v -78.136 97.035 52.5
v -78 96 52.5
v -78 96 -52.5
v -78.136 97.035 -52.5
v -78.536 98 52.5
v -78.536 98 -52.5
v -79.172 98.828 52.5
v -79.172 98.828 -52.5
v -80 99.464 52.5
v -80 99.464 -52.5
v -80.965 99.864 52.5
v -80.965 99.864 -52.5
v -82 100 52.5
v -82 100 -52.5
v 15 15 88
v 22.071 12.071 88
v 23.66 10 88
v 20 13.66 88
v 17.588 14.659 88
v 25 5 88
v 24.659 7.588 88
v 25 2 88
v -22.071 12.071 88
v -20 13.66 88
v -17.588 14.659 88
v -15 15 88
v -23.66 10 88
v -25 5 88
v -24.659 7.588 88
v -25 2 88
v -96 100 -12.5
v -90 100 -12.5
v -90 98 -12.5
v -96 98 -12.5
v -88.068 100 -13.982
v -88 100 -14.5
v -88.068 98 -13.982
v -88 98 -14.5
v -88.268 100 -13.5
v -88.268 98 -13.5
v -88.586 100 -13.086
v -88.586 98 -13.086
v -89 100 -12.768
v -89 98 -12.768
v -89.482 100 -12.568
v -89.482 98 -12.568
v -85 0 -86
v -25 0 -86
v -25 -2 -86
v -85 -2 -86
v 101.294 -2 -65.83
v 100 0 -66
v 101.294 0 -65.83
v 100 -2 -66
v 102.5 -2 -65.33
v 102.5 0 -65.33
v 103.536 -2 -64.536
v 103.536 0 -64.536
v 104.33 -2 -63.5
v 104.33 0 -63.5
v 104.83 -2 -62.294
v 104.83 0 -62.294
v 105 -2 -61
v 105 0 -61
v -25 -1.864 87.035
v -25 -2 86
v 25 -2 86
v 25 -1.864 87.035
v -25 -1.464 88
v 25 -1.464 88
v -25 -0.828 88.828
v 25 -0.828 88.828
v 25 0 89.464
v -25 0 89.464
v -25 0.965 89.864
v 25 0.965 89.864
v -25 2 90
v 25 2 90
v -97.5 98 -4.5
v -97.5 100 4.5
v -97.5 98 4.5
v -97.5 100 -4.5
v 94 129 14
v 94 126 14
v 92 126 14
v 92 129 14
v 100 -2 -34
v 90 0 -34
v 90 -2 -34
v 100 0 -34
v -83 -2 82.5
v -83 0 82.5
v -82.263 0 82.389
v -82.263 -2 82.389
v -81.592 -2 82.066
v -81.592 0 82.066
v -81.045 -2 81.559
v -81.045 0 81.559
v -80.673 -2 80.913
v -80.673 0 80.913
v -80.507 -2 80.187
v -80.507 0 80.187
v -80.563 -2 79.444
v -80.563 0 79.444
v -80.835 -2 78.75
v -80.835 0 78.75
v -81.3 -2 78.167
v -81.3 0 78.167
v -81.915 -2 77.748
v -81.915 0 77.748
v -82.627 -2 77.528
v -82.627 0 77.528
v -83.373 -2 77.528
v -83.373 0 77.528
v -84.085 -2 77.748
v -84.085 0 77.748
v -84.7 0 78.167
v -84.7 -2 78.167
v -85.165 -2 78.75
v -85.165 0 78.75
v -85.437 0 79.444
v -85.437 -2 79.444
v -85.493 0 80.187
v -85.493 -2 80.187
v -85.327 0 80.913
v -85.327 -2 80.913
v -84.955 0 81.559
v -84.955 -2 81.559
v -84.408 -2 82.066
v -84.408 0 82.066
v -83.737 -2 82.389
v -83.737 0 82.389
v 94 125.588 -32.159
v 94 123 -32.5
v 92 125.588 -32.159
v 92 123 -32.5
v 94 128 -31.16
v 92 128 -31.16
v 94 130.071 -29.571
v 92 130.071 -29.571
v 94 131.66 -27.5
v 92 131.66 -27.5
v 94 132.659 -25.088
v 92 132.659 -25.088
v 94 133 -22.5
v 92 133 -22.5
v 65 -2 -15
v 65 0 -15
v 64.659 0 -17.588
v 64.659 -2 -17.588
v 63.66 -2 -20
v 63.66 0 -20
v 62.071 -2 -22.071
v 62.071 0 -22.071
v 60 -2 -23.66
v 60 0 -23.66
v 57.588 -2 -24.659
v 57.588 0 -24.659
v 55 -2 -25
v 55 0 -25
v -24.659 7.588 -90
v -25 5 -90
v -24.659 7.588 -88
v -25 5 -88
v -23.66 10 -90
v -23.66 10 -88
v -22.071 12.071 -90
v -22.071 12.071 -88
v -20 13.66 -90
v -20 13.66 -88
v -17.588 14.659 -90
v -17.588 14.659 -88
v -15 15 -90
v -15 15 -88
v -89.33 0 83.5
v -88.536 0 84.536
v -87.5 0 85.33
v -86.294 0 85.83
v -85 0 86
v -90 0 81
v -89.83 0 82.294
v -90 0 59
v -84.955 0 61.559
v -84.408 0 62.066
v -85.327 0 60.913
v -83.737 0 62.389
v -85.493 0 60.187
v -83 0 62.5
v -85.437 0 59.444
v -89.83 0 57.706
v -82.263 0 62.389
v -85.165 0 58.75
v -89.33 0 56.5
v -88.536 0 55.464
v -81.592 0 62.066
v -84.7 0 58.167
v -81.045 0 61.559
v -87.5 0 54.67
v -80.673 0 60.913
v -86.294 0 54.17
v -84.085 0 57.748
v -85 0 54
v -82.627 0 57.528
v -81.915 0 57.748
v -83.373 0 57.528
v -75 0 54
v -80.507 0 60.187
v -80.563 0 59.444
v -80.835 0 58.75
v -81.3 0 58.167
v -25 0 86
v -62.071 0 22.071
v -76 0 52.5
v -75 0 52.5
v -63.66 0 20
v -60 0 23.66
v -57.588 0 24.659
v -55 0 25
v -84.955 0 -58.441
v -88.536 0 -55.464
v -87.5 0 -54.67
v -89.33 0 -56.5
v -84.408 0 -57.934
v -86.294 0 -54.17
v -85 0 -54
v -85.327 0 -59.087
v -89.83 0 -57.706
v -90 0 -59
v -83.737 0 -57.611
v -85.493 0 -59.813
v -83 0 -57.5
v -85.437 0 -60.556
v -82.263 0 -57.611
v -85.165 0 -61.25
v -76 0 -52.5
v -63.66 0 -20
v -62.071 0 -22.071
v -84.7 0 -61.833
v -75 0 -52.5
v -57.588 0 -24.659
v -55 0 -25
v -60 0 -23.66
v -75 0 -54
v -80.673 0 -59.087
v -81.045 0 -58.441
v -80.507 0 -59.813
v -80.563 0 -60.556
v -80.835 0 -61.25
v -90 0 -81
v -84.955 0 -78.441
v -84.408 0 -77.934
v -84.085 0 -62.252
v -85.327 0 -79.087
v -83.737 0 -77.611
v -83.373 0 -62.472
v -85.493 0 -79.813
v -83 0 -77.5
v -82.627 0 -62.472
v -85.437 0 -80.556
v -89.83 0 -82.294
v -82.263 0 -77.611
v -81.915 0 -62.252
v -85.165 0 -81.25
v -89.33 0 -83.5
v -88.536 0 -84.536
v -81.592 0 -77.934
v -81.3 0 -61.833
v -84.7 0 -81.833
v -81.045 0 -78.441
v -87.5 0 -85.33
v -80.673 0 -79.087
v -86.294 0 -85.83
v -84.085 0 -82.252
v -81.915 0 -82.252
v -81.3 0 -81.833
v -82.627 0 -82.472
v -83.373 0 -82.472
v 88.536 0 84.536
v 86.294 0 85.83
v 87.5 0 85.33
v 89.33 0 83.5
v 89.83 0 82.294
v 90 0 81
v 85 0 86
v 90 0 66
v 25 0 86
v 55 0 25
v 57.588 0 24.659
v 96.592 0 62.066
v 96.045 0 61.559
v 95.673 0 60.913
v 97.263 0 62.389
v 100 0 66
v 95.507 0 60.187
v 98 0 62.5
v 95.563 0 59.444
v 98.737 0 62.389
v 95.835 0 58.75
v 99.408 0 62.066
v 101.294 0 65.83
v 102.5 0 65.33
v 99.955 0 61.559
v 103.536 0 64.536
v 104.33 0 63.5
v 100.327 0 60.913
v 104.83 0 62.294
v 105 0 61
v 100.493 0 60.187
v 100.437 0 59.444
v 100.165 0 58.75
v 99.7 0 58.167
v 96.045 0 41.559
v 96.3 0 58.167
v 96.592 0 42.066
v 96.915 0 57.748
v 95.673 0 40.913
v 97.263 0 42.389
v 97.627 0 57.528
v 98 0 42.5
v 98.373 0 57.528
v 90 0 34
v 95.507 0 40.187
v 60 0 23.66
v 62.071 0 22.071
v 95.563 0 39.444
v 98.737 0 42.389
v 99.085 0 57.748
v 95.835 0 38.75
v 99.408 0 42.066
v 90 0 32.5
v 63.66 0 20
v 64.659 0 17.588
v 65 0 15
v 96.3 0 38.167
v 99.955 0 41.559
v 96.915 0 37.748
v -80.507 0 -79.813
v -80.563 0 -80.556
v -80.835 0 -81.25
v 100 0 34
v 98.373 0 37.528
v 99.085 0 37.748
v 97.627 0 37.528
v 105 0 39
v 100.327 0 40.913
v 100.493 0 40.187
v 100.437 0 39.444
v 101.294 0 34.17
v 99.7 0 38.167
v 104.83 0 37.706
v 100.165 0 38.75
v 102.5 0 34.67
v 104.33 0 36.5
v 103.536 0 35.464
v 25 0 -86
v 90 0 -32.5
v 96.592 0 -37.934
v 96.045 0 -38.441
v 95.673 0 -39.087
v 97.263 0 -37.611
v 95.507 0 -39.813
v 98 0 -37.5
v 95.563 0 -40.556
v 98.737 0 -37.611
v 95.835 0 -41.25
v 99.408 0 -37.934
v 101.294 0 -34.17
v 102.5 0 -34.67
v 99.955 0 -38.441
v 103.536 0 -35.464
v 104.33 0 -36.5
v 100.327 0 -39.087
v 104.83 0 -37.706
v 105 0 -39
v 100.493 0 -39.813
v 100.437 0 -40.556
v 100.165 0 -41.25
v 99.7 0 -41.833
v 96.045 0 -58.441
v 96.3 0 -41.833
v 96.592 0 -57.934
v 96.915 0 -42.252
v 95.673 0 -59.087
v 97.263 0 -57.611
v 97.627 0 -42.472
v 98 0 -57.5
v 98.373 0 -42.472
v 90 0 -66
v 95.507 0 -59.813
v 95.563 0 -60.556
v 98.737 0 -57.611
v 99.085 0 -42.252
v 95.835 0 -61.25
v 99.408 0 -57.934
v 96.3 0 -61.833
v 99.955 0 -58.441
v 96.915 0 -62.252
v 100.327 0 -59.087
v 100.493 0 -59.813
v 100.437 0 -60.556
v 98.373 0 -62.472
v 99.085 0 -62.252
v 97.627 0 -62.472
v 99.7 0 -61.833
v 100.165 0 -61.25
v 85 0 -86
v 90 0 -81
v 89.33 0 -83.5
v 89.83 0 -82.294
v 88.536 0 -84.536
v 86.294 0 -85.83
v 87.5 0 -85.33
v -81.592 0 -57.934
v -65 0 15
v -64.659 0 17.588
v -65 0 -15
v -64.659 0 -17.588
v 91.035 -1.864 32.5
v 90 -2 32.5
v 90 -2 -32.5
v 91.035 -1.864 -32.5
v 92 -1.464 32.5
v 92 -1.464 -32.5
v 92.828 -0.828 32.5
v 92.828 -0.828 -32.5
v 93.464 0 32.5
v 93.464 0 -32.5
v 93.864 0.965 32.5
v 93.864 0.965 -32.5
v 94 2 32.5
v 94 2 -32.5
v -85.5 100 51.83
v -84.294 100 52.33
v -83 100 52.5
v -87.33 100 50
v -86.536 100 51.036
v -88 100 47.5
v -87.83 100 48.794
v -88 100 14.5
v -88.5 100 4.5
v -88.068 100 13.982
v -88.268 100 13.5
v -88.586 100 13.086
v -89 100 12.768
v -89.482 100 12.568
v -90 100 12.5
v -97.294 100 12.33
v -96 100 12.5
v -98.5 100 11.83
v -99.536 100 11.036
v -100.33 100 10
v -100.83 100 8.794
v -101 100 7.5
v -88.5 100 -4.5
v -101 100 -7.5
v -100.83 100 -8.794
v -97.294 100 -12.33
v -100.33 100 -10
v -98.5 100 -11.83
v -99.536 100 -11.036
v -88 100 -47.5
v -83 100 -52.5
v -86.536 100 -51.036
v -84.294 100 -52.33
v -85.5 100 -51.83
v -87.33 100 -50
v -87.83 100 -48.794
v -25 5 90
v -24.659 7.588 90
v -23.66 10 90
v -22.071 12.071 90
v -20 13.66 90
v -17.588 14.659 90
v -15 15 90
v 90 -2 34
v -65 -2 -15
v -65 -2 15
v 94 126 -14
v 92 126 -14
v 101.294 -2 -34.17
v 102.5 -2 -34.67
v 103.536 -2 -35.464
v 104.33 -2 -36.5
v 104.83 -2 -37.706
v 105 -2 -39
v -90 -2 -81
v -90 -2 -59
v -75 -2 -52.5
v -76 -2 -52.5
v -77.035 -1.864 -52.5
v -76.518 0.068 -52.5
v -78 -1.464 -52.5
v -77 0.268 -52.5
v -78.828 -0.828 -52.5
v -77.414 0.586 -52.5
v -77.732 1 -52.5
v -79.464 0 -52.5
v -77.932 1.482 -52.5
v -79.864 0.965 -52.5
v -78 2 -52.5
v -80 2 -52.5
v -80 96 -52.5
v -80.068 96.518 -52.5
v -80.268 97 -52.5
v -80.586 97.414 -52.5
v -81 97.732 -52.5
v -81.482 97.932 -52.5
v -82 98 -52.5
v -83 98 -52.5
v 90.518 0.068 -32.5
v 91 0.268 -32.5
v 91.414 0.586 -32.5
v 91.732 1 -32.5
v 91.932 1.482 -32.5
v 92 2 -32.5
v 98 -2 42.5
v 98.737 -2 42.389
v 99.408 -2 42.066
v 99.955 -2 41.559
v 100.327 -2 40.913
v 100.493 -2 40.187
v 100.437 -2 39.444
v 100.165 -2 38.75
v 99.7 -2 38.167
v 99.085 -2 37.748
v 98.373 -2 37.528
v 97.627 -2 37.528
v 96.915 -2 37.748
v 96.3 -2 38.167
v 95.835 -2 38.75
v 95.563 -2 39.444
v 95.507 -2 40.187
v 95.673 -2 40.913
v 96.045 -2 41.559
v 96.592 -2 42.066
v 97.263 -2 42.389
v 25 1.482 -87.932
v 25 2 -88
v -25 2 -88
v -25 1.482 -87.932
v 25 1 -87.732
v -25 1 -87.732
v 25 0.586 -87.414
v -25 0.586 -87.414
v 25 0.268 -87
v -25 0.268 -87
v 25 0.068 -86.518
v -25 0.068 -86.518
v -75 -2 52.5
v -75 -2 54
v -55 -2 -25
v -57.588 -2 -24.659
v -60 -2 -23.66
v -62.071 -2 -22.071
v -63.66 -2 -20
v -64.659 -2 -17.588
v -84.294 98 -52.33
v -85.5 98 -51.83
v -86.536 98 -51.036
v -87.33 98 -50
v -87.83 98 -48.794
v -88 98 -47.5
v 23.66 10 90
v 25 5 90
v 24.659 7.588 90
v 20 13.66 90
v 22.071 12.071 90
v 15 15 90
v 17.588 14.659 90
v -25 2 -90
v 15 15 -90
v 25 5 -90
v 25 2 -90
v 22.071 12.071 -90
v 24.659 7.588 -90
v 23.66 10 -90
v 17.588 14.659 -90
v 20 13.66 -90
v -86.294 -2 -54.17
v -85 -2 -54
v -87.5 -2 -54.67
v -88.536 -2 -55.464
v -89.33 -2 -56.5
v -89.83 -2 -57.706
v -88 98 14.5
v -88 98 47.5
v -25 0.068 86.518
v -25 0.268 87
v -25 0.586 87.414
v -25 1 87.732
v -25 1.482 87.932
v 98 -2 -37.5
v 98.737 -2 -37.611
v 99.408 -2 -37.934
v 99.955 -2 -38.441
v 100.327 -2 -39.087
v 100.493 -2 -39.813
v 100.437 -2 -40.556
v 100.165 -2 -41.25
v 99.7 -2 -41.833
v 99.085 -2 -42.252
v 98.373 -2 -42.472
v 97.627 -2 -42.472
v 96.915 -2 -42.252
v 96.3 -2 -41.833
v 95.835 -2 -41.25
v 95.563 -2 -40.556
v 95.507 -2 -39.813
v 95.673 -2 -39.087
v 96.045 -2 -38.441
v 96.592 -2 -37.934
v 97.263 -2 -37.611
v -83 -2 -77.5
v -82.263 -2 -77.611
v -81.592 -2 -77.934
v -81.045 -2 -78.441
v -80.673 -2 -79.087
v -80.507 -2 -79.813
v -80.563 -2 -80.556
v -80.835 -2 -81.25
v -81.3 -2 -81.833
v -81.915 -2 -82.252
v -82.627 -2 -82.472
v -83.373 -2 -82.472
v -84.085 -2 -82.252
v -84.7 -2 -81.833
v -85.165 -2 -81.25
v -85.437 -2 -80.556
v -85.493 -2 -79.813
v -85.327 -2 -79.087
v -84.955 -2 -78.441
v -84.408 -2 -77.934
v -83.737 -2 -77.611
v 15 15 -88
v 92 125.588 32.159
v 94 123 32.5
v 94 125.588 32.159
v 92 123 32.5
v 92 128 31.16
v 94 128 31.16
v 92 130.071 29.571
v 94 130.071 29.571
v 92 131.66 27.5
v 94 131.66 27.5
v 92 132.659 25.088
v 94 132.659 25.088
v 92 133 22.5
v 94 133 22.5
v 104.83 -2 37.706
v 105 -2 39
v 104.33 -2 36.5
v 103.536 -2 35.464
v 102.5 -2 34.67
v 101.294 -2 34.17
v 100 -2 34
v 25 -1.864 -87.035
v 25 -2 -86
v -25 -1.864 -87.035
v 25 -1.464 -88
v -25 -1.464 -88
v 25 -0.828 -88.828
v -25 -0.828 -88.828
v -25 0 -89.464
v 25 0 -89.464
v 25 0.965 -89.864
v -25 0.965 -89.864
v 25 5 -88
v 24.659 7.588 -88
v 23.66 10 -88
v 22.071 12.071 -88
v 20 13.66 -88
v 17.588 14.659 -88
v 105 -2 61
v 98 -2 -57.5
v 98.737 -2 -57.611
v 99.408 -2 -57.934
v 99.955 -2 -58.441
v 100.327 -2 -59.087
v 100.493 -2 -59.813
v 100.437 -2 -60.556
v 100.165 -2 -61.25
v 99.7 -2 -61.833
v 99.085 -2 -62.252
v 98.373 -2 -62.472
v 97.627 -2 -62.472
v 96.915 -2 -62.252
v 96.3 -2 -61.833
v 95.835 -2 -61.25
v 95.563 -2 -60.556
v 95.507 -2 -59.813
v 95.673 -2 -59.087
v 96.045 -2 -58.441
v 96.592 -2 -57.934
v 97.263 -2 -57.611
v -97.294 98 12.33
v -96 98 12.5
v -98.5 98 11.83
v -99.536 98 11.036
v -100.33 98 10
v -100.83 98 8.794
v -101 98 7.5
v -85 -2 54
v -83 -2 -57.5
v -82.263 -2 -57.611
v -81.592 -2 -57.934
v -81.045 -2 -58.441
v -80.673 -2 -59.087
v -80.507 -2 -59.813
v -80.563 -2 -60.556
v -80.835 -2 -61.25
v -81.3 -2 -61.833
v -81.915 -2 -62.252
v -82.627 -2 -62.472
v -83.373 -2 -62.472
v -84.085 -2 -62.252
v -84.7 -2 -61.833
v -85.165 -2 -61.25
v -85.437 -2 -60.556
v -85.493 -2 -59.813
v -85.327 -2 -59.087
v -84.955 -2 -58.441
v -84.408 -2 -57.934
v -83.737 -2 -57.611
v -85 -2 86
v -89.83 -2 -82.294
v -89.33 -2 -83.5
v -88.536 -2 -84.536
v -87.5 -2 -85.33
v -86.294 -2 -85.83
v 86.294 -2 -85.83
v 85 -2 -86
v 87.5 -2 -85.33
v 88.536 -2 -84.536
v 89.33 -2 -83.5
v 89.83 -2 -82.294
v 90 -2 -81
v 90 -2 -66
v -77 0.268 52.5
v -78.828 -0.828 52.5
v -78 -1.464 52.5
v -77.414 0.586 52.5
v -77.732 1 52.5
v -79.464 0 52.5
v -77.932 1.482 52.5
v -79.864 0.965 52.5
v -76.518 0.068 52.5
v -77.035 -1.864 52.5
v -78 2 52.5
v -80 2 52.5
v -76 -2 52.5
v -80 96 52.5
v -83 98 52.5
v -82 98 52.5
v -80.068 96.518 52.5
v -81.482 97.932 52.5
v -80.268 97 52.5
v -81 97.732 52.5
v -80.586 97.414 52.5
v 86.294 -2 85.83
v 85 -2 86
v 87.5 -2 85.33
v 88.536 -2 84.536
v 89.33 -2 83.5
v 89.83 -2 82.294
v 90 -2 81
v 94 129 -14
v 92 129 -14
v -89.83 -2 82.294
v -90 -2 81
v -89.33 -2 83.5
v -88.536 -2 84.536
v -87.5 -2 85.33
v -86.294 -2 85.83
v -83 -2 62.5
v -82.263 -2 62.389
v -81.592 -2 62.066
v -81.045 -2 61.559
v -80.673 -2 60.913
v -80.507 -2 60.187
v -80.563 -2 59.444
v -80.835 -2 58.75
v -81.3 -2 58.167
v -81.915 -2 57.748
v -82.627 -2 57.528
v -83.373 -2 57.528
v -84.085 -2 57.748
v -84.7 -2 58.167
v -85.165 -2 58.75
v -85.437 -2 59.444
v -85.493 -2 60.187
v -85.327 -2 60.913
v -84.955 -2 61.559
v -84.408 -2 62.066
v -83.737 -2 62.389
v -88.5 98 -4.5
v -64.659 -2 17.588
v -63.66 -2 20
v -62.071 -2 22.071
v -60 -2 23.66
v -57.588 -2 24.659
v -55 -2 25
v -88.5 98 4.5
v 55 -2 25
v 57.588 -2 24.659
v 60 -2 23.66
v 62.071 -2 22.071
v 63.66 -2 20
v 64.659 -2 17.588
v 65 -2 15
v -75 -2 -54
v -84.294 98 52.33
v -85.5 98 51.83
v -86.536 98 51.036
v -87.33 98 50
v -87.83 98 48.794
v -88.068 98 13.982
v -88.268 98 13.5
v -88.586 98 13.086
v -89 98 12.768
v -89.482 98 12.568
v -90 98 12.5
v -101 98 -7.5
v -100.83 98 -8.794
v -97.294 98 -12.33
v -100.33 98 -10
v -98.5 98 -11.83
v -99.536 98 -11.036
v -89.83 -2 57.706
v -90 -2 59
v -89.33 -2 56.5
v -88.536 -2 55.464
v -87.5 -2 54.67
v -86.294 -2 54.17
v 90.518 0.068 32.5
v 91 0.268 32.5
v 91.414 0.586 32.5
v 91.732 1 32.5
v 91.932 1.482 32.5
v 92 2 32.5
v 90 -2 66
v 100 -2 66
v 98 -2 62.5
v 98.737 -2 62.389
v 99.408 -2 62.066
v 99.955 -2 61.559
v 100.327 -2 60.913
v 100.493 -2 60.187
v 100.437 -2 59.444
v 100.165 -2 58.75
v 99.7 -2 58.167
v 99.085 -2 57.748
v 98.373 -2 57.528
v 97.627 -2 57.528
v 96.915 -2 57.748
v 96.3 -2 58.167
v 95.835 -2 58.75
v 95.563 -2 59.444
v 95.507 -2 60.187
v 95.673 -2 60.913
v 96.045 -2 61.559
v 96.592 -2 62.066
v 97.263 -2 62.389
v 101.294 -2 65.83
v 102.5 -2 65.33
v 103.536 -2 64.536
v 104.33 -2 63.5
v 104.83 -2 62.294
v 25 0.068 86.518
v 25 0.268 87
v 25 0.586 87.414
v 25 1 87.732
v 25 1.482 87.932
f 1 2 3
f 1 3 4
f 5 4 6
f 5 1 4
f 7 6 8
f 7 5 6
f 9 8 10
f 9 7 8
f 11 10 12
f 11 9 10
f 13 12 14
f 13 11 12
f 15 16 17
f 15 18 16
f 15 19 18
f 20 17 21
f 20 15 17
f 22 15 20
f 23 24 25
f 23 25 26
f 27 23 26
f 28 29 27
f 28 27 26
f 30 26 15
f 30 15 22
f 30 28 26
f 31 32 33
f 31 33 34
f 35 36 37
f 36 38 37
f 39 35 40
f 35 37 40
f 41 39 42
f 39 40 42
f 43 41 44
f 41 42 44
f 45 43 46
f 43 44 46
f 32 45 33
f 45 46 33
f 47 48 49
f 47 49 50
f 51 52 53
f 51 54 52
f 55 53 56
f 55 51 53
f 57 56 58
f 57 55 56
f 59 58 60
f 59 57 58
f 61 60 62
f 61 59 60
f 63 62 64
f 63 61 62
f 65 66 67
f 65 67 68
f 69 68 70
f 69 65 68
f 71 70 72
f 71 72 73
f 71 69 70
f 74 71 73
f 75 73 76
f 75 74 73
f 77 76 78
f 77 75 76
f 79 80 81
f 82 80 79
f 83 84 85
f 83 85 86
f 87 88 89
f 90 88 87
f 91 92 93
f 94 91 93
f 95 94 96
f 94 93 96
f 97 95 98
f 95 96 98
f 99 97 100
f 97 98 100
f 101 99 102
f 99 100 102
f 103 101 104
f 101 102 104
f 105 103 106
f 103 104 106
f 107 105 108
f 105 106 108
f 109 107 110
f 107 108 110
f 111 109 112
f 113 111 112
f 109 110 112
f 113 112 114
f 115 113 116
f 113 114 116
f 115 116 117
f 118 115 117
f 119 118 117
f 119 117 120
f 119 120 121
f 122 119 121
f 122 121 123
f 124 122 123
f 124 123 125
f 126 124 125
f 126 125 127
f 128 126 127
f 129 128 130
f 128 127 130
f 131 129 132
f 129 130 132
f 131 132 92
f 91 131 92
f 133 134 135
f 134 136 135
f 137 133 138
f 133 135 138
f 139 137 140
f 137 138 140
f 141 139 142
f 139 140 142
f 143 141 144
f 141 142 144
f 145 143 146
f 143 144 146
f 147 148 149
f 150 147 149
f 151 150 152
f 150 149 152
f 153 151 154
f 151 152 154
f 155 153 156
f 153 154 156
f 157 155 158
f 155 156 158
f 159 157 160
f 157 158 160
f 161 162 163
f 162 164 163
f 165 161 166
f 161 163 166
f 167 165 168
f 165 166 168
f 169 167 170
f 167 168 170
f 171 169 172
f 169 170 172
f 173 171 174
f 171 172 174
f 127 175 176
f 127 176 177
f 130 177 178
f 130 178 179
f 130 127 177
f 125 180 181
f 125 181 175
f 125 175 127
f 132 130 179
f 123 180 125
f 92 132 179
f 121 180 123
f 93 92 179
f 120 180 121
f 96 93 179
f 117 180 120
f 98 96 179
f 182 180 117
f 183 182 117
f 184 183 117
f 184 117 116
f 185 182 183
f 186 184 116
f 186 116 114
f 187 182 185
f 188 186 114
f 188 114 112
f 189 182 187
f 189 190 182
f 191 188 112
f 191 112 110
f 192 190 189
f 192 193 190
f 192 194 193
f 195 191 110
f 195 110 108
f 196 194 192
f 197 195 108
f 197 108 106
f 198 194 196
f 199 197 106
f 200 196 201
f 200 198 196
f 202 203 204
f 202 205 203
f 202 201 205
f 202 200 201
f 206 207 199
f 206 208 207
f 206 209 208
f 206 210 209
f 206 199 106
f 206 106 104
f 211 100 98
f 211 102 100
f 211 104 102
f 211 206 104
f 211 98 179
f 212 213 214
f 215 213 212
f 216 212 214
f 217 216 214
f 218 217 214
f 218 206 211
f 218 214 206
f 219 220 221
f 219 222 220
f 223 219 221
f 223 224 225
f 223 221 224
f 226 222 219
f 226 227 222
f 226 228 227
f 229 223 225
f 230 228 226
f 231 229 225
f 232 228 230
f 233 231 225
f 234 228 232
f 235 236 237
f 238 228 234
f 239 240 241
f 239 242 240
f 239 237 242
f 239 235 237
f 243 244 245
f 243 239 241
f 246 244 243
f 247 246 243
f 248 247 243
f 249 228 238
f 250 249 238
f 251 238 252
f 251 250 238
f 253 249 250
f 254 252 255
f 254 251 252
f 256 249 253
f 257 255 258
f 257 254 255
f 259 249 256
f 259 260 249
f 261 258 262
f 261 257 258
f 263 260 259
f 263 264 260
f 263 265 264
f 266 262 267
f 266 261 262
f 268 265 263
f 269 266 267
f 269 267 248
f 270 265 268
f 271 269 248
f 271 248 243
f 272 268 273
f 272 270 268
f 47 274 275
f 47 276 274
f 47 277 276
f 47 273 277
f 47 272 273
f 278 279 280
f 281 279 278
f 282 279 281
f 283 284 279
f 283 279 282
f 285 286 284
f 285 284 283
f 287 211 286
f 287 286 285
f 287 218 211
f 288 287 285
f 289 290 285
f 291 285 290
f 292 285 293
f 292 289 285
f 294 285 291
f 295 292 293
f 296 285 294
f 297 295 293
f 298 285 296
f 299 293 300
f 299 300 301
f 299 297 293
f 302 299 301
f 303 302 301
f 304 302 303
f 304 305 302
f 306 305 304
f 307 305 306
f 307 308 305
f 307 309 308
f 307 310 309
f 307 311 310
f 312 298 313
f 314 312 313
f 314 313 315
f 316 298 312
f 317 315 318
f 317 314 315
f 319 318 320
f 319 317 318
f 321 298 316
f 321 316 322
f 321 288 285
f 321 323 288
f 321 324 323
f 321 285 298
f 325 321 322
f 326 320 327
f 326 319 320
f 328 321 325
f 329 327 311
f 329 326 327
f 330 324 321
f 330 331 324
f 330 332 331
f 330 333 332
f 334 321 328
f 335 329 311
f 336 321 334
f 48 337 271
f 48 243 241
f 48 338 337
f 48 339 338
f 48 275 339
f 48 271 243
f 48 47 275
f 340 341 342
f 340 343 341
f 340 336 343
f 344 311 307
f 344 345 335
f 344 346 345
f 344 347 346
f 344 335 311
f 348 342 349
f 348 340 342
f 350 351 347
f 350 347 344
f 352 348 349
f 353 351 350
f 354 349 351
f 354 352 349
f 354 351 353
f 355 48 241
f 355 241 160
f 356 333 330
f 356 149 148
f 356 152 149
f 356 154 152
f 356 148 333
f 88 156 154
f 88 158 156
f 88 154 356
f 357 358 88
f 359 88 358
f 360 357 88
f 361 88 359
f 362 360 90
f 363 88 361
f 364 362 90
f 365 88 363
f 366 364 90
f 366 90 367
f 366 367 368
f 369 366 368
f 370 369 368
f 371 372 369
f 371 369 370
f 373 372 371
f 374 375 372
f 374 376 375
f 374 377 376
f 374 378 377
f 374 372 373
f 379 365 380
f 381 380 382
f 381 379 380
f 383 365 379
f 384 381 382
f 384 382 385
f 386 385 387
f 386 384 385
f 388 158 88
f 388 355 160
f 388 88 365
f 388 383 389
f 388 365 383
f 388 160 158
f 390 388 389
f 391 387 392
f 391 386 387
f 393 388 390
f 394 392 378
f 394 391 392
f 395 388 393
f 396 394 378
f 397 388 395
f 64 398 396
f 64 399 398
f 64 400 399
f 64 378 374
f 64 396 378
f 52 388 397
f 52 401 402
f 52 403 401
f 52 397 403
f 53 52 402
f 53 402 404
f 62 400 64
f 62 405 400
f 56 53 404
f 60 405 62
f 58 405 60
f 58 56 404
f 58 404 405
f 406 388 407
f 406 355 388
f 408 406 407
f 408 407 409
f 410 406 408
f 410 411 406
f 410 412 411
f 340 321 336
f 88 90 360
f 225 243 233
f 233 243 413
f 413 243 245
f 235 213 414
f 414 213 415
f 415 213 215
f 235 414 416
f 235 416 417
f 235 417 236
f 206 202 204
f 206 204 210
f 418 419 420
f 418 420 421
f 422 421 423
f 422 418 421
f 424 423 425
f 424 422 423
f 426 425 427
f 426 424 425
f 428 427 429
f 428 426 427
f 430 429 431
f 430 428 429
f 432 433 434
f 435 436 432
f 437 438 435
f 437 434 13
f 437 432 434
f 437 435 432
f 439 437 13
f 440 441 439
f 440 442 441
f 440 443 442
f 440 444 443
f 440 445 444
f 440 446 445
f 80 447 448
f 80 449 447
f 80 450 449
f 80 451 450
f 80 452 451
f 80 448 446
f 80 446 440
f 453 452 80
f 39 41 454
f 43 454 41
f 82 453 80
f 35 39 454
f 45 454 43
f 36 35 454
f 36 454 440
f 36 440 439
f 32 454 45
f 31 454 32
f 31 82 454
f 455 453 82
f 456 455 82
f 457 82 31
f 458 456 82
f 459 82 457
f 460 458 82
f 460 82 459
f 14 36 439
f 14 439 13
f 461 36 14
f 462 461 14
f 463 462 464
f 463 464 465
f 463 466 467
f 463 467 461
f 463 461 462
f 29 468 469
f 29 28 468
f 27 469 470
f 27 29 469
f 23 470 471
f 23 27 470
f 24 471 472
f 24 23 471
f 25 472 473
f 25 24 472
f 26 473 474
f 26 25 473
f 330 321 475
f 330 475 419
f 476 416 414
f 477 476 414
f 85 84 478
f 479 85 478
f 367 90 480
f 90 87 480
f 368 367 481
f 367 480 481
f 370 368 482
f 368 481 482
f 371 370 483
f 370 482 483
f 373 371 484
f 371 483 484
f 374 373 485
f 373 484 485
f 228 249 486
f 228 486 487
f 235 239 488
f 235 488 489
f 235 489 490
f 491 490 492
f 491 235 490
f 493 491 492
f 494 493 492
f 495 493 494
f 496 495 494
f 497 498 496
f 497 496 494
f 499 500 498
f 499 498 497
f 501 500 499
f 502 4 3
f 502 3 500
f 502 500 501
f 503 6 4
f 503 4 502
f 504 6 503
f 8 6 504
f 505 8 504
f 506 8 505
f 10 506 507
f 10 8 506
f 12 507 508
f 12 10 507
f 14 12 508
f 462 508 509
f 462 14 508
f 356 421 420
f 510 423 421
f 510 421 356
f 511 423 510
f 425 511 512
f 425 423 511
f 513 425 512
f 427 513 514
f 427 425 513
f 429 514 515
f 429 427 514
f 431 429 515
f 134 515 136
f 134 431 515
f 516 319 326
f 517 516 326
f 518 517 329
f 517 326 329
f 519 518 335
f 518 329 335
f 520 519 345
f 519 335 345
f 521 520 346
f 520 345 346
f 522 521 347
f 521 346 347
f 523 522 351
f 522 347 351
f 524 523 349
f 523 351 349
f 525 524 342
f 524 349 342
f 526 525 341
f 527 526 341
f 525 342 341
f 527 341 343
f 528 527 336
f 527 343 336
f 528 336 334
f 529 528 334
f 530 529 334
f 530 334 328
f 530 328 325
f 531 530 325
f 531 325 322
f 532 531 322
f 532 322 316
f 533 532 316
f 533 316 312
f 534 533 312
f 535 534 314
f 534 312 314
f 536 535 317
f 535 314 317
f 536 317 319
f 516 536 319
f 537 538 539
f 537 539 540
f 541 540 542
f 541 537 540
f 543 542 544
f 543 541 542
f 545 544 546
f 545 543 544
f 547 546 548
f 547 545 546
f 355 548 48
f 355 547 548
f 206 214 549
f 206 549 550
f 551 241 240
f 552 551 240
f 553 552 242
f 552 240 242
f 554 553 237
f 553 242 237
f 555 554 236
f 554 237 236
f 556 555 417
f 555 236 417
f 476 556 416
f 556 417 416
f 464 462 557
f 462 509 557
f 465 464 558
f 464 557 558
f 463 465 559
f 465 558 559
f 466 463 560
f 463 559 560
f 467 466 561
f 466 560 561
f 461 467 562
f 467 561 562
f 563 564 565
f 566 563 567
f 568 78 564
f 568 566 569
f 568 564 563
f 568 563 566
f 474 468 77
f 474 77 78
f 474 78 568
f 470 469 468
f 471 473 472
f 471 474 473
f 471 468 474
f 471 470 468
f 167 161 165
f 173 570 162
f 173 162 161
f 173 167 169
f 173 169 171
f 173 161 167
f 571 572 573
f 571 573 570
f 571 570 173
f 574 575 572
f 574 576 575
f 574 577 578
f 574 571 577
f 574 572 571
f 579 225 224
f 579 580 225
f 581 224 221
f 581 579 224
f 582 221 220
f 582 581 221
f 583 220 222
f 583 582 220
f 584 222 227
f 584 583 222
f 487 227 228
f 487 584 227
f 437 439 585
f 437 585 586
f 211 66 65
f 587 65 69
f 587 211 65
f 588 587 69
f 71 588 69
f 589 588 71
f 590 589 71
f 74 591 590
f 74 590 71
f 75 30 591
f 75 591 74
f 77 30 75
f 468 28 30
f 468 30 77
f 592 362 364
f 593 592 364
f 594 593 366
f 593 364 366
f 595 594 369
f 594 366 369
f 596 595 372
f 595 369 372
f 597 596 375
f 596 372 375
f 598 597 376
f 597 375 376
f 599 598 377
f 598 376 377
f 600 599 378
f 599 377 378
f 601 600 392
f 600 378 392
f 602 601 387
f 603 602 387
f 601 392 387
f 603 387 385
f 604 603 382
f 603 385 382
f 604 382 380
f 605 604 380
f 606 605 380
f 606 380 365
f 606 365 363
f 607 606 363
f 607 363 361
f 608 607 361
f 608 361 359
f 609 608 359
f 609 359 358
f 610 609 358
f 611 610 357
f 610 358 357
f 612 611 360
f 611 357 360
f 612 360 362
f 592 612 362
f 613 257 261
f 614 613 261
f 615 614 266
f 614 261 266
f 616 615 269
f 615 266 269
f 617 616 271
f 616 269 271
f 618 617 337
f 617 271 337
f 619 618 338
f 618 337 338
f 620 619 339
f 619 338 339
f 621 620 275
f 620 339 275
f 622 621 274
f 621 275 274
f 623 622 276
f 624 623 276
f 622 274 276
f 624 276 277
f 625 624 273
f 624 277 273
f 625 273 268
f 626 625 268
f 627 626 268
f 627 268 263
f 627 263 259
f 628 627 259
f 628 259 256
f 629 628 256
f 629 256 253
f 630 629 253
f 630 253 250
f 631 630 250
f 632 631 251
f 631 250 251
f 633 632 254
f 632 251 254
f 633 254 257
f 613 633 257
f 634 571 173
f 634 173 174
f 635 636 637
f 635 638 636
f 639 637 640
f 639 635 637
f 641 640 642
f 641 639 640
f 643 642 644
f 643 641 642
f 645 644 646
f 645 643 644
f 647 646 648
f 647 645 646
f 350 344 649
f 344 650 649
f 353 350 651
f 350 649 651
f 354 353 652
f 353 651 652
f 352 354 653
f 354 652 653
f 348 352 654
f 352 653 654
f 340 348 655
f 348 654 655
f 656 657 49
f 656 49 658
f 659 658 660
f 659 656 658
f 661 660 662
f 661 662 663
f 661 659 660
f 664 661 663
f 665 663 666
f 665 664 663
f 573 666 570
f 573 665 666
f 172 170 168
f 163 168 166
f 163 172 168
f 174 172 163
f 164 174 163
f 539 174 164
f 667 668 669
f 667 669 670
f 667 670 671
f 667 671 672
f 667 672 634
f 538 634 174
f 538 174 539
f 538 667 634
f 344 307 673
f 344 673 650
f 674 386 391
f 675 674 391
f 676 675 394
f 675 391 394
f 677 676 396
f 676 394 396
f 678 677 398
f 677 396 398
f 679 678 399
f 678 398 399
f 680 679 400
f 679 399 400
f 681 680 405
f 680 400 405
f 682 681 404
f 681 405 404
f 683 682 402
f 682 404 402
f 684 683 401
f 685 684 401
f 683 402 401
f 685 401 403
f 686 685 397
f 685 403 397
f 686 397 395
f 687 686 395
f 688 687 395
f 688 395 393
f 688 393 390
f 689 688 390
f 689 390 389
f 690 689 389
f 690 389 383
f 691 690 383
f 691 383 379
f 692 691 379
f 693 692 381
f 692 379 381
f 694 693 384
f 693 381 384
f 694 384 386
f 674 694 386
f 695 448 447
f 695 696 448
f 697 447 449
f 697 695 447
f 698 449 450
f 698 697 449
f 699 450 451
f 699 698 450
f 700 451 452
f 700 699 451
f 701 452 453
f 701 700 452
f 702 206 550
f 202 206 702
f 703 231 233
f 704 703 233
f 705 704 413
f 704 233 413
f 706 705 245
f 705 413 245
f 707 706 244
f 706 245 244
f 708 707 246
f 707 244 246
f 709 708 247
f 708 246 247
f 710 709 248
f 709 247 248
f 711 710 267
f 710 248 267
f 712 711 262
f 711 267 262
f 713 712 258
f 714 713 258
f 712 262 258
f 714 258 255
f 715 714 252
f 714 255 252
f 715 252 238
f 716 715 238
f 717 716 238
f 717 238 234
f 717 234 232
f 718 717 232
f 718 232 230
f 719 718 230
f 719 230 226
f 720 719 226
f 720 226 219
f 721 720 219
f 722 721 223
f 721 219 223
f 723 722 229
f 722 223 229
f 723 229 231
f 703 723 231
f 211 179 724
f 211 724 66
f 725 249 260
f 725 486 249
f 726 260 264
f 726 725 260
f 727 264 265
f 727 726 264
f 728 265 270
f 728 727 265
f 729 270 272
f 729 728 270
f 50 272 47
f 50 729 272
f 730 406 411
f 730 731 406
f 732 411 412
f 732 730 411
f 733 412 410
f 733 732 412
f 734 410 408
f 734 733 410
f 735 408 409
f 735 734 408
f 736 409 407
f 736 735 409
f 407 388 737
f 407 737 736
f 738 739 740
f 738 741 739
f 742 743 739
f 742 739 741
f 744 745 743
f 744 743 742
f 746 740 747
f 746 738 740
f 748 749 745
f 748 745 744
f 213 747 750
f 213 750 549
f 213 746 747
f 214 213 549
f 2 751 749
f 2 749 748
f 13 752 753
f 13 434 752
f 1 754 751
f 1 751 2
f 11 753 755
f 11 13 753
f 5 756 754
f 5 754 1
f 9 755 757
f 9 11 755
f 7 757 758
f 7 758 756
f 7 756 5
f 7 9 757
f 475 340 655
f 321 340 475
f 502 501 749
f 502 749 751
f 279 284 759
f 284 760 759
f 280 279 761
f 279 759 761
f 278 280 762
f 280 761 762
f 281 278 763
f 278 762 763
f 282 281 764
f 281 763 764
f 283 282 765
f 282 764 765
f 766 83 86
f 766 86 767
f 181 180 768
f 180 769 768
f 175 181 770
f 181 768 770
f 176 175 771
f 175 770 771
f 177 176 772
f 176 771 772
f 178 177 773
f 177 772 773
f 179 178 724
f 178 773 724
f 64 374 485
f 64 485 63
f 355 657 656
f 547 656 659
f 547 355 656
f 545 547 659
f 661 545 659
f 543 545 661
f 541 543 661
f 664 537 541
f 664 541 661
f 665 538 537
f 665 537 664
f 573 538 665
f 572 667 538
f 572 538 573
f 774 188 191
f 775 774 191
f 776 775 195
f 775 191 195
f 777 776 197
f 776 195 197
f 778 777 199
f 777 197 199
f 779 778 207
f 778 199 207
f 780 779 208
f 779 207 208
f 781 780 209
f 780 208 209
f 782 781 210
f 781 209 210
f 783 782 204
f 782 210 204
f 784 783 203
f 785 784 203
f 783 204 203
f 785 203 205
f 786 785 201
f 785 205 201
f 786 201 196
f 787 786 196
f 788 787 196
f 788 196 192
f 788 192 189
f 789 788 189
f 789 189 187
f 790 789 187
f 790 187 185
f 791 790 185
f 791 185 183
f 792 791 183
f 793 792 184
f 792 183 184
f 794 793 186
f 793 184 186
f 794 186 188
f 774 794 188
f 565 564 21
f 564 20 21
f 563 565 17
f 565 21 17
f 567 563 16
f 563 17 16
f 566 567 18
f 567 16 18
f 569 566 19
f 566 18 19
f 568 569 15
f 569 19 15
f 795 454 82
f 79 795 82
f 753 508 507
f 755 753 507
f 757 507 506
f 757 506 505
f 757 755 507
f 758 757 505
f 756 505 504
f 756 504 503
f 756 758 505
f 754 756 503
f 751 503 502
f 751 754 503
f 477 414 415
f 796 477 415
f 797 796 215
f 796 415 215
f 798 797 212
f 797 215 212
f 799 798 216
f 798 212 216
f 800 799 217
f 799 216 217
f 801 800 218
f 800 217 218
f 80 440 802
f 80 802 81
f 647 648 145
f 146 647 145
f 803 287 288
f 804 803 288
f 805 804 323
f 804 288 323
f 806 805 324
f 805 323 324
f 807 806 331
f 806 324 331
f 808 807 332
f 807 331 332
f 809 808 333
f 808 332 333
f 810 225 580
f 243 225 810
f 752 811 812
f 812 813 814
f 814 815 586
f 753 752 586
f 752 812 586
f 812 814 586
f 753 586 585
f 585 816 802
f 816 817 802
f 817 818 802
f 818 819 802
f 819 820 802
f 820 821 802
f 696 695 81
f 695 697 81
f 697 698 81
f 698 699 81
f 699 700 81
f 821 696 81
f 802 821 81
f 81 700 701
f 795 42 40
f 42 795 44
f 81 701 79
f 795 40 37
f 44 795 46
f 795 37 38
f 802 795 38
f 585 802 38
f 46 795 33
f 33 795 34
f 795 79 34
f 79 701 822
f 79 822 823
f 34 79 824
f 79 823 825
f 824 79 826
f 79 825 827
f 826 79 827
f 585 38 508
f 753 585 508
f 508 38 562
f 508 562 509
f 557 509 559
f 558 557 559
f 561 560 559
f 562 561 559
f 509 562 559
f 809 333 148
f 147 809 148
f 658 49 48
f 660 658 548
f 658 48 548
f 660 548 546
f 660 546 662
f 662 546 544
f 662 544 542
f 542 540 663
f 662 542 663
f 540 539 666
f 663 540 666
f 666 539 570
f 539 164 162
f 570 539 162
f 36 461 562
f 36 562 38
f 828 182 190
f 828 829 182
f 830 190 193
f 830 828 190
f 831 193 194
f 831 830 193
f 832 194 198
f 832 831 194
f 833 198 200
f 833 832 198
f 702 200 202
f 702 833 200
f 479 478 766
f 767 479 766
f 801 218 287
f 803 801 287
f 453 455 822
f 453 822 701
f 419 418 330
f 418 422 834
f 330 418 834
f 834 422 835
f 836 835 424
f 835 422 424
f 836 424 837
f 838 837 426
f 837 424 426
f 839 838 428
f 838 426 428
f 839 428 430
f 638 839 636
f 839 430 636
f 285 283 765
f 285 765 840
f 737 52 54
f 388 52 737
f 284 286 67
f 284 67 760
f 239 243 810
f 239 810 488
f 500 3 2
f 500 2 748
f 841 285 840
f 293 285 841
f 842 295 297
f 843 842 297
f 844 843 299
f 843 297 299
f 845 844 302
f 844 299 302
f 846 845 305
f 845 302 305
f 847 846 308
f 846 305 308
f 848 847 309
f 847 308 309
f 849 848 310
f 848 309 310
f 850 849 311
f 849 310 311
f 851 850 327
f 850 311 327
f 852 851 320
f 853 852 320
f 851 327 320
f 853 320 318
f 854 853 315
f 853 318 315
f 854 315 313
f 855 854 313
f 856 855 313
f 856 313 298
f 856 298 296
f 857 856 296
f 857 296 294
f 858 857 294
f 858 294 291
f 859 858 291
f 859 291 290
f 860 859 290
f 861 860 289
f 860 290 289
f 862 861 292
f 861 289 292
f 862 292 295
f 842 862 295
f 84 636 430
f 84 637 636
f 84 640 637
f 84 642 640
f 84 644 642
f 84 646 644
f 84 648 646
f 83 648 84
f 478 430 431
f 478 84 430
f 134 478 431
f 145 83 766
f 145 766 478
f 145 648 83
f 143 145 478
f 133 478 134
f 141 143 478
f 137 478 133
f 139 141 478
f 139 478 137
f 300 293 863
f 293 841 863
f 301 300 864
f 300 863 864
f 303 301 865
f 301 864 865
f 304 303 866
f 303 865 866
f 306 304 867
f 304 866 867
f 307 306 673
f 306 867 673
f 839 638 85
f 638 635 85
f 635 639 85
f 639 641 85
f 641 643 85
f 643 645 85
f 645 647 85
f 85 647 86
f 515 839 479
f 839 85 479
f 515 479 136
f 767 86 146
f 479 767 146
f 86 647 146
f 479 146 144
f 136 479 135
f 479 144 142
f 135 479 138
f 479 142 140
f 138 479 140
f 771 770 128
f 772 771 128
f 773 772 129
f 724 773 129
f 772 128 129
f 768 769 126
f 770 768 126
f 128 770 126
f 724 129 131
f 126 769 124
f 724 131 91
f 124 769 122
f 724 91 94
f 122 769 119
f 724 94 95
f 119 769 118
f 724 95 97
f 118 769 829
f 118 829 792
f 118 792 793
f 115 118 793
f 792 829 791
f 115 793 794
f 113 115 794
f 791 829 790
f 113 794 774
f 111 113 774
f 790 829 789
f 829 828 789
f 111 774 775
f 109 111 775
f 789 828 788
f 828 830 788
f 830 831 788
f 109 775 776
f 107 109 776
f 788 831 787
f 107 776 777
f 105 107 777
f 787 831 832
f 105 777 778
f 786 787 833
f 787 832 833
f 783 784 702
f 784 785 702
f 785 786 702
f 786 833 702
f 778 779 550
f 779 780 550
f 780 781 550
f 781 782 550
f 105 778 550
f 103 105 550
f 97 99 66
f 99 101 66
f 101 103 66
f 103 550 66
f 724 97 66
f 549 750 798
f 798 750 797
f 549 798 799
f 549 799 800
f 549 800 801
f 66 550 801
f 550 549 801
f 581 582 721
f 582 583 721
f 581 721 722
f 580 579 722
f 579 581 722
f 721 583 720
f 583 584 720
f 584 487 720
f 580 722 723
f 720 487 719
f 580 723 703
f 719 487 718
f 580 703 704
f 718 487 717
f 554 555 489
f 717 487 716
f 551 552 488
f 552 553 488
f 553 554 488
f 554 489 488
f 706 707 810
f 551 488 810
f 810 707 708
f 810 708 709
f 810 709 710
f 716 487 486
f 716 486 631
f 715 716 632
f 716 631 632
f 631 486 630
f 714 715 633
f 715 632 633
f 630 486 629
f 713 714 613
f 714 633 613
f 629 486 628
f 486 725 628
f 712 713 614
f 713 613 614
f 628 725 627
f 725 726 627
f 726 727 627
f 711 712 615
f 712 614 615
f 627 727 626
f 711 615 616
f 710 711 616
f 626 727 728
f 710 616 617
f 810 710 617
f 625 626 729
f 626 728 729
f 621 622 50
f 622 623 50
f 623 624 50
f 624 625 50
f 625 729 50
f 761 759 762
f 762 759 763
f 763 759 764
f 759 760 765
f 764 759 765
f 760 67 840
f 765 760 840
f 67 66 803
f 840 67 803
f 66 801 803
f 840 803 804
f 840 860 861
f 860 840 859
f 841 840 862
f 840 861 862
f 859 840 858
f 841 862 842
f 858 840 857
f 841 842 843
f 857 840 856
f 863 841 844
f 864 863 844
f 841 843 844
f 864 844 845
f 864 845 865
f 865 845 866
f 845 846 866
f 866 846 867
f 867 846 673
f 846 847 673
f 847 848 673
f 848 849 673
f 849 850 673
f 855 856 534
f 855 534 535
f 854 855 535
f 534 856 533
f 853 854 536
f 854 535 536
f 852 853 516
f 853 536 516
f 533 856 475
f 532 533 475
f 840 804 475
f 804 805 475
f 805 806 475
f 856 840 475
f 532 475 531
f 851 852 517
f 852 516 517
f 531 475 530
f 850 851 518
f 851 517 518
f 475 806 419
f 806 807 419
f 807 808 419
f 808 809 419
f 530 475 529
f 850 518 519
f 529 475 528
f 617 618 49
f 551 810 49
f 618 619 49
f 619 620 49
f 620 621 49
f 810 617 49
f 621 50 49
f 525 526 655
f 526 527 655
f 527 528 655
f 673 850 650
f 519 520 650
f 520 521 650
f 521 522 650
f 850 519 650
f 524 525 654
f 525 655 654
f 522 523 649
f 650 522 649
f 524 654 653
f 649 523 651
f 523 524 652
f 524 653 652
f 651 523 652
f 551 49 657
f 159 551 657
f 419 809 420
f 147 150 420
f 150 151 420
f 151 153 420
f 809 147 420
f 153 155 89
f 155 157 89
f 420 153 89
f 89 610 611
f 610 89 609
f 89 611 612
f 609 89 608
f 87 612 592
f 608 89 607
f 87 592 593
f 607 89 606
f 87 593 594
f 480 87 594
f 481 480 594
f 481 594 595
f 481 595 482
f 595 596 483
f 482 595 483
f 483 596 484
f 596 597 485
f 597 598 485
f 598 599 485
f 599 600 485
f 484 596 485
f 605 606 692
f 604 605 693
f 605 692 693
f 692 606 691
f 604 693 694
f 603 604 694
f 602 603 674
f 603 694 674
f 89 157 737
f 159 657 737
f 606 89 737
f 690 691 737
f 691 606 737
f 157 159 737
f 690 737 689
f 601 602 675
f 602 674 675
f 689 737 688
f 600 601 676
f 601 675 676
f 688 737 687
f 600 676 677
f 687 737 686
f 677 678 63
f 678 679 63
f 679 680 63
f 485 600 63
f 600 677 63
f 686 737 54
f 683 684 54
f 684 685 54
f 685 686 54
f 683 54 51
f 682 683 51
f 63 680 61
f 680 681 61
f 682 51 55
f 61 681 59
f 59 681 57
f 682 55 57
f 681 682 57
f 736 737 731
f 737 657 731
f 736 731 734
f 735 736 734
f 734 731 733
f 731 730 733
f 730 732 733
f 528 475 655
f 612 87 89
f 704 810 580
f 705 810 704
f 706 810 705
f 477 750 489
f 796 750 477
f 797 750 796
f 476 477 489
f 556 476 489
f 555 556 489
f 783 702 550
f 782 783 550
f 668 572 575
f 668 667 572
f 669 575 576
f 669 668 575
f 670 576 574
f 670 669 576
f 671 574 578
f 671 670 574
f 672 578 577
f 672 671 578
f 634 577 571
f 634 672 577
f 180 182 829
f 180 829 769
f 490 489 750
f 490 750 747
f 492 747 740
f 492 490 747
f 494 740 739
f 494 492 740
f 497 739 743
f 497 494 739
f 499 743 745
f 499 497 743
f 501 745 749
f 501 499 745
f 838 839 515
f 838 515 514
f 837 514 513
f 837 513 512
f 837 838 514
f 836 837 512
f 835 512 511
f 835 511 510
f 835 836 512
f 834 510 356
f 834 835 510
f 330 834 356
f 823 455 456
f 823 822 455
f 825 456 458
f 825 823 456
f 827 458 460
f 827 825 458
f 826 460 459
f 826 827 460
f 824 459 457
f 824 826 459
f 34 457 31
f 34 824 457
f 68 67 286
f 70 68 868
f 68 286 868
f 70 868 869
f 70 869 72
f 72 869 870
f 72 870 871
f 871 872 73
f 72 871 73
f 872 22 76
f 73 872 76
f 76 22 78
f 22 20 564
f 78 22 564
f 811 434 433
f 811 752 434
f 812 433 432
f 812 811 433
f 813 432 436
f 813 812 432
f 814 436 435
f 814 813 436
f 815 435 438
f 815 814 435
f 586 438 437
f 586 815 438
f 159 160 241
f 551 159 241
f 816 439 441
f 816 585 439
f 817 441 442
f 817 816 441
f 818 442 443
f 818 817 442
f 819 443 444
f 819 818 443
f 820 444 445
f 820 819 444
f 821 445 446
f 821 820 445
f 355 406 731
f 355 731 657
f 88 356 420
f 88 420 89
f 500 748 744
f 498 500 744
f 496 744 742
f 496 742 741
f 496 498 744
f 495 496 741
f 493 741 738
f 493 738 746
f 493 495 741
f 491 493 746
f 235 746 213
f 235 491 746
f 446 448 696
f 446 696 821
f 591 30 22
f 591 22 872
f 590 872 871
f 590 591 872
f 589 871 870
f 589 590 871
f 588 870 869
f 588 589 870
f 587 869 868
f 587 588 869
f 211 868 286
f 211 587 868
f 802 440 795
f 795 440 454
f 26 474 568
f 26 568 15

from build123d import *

# Parameters (mm, degrees)
SKETCH_2_R                   = 2.5
SM_BASE_FLANGE_1_DEPTH       = 2
FILLET_1_R                   = 5
SM_EDGE_FLANGE_1_DEPTH       = 105
SM_EDGE_FLANGE_2_DEPTH       = 65
SM_START                     = 2
SM_EDGE_FLANGE_2_PROFILE_W   = 65
SM_EDGE_FLANGE_2_PROFILE_H   = 131
SM_EDGE_FLANGE_2_PROFILE_W_2 = 28
SM_EDGE_FLANGE_2_PROFILE_H_2 = 3
SM_EDGE_FLANGE_2_FLAT_DEPTH  = 2
SM_EDGE_FLANGE_3_DEPTH       = 105
SM_EDGE_FLANGE_3_PROFILE_W   = 9
SM_EDGE_FLANGE_3_PROFILE_H   = 9
SM_EDGE_FLANGE_3_FLAT_DEPTH  = 2
FILLET_3_R                   = 5
FILLET_4_R                   = 2
SM_EDGE_FLANGE_4_DEPTH       = 50
SM_EDGE_FLANGE_4_BEND_DEPTH  = 50
FILLET_2_R                   = 10


# Sheet-metal steps are written as plain solids
with BuildPart() as part:
    # Sketch 2 → Базовая кромка1 (new body)
    with BuildSketch(Plane(origin=(0, 0, 0), x_dir=(1, 0, 0), z_dir=(0, 1, 0))):
        Polygon((-90, -54), (-90, -86), (90, -86), (90, -66), (105, -66), (105, -34), (90, -34), (90, 34), (105, 34), (105, 66), (90, 66), (90, 86), (-90, 86), (-90, 54), (-75, 54), (-75, -54), align=None)
        with Locations(Location((-83, 80, 0), (0, 0, 270))):
            Circle(SKETCH_2_R, mode=Mode.SUBTRACT)
        with Locations(Location((-83, 60, 0), (0, 0, 270))):
            Circle(SKETCH_2_R, mode=Mode.SUBTRACT)
        with Locations(Location((98, 60, 0), (0, 0, 270))):
            Circle(SKETCH_2_R, mode=Mode.SUBTRACT)
        with Locations(Location((98, 40, 0), (0, 0, 270))):
            Circle(SKETCH_2_R, mode=Mode.SUBTRACT)
        with Locations(Location((98, -40, 0), (0, 0, 270))):
            Circle(SKETCH_2_R, mode=Mode.SUBTRACT)
        with Locations(Location((98, -60, 0), (0, 0, 270))):
            Circle(SKETCH_2_R, mode=Mode.SUBTRACT)
        with Locations(Location((-83, -60, 0), (0, 0, 270))):
            Circle(SKETCH_2_R, mode=Mode.SUBTRACT)
        with Locations(Location((-83, -80, 0), (0, 0, 270))):
            Circle(SKETCH_2_R, mode=Mode.SUBTRACT)
        with BuildLine():
            Line((-65, 15), (-65, -15))
            ThreePointArc((-65, -15), (-62.071067812, -22.071067812), (-55, -25))
            Line((-55, -25), (55, -25))
            ThreePointArc((55, -25), (62.071067812, -22.071067812), (65, -15))
            Line((65, -15), (65, 15))
            ThreePointArc((65, 15), (62.071067812, 22.071067812), (55, 25))
            Line((55, 25), (-55, 25))
            ThreePointArc((-55, 25), (-62.071067812, 22.071067812), (-65, 15))
        make_face(mode=Mode.SUBTRACT)
    extrude(amount=-SM_BASE_FLANGE_1_DEPTH)

    # Скругление1
    fillet_1_edges = [part.edges().sort_by_distance(p)[0] for p in [
        (105, -1, 66),
        (90, -1, 86),
        (-90, -1, 86),
        (-90, -1, 54),
        (-90, -1, -54),
        (-90, -1, -86),
        (90, -1, -86),
        (105, -1, -66),
        (105, -1, -34),
        (105, -1, 34),
    ]]
    fillet(fillet_1_edges, radius=FILLET_1_R)

    # Ребро-кромка1 section (across the edge) → Ребро-кромка1 (add)
    with BuildSketch(Plane(origin=(-78, 0, -52.5), x_dir=(1, 0, 0), z_dir=(0, 0, 1))):
        with BuildLine():
            Line((-2, 2), (-2, 96))
            Line((-2, 96), (0, 96))
            Line((0, 96), (0, 2))
            ThreePointArc((0, 2), (0.585786438, 0.585786438), (2, 0))
            Line((2, 0), (3, 0))
            Line((3, 0), (3, -2))
            Line((3, -2), (2, -2))
            ThreePointArc((2, -2), (-0.828427125, -0.828427125), (-2, 2))
        make_face()
    extrude(amount=SM_EDGE_FLANGE_1_DEPTH)

    # Ребро-кромка2 bend section (across the edge) → Ребро-кромка2 (add)
    with BuildSketch(Plane(origin=(92, 0, 32.5), x_dir=(-1, 0, 0), z_dir=(0, 0, -1))):
        with BuildLine():
            Line((-2, 2), (0, 2))
            ThreePointArc((0, 2), (0.585786438, 0.585786438), (2, 0))
            Line((2, 0), (2, -2))
            ThreePointArc((2, -2), (-0.828427125, -0.828427125), (-2, 2))
        make_face()
    extrude(amount=SM_EDGE_FLANGE_2_DEPTH)

    # Ребро-кромка2 profile (on flange) → Ребро-кромка2 flat (add)
    with BuildSketch(Plane(origin=(92, 0, 0), x_dir=(0, 0, -1), z_dir=(1, 0, 0)).offset(SM_START)):
        with Locations((0, 67.5)):
            Rectangle(SM_EDGE_FLANGE_2_PROFILE_W, SM_EDGE_FLANGE_2_PROFILE_H)
        with Locations((0, 127.5)):
            Rectangle(SM_EDGE_FLANGE_2_PROFILE_W_2, SM_EDGE_FLANGE_2_PROFILE_H_2, mode=Mode.SUBTRACT)
    extrude(amount=-SM_EDGE_FLANGE_2_FLAT_DEPTH)

    # Ребро-кромка3 bend section (across the edge) → Ребро-кромка3 (add)
    with BuildSketch(Plane(origin=(-80, 98, 52.5), x_dir=(0, -1, 0), z_dir=(0, 0, -1))):
        with BuildLine():
            Line((-2, 2), (0, 2))
            ThreePointArc((0, 2), (0.585786438, 0.585786438), (2, 0))
            Line((2, 0), (2, -2))
            ThreePointArc((2, -2), (-0.828427125, -0.828427125), (-2, 2))
        make_face()
    extrude(amount=SM_EDGE_FLANGE_3_DEPTH)

    # Ребро-кромка3 profile (on flange) → Ребро-кромка3 flat (add)
    with BuildSketch(Plane(origin=(-80, 98, 0), x_dir=(0, 0, -1), z_dir=(0, 1, 0)).offset(SM_START)):
        Polygon((-52.5, 8), (-52.5, 2), (52.5, 2), (52.5, 8), (12.5, 8), (12.5, 21), (-12.5, 21), (-12.5, 8), align=None)
        with Locations((0, 13)):
            Rectangle(SM_EDGE_FLANGE_3_PROFILE_W, SM_EDGE_FLANGE_3_PROFILE_H, mode=Mode.SUBTRACT)
    extrude(amount=-SM_EDGE_FLANGE_3_FLAT_DEPTH)

    # Скругление3
    fillet_3_edges = [part.edges().sort_by_distance(p)[0] for p in [
        (-88, 99, 52.5),
        (-88, 99, -52.5),
        (-101, 99, -12.5),
        (-101, 99, 12.5),
    ]]
    fillet(fillet_3_edges, radius=FILLET_3_R)

    # Скругление4
    fillet_4_edges = [part.edges().sort_by_distance(p)[0] for p in [
        (-88, 99, -12.5),
        (-88, 99, 12.5),
    ]]
    fillet(fillet_4_edges, radius=FILLET_4_R)

    # Ребро-кромка4 section (across the edge) → Ребро-кромка4 (add)
    with BuildSketch(Plane(origin=(-25, 0, 88), x_dir=(0, 0, -1), z_dir=(1, 0, 0))):
        with BuildLine():
            Line((-2, 2), (-2, 15))
            Line((-2, 15), (0, 15))
            Line((0, 15), (0, 2))
            ThreePointArc((0, 2), (0.585786438, 0.585786438), (2, 0))
            Line((2, 0), (2, -2))
            ThreePointArc((2, -2), (-0.828427125, -0.828427125), (-2, 2))
        make_face()
    extrude(amount=SM_EDGE_FLANGE_4_DEPTH)

    # Ребро-кромка4 section 2 (across the edge) → Ребро-кромка4 bend (add)
    with BuildSketch(Plane(origin=(25, 0, -88), x_dir=(0, 0, 1), z_dir=(-1, 0, 0))):
        with BuildLine():
            Line((-2, 2), (-2, 15))
            Line((-2, 15), (0, 15))
            Line((0, 15), (0, 2))
            ThreePointArc((0, 2), (0.585786438, 0.585786438), (2, 0))
            Line((2, 0), (2, -2))
            ThreePointArc((2, -2), (-0.828427125, -0.828427125), (-2, 2))
        make_face()
    extrude(amount=SM_EDGE_FLANGE_4_BEND_DEPTH)

    # Скругление2
    fillet_2_edges = [part.edges().sort_by_distance(p)[0] for p in [
        (93, 133, 32.5),
        (93, 133, -32.5),
        (-25, 15, 89),
        (25, 15, 89),
        (25, 15, -89),
        (-25, 15, -89),
    ]]
    fillet(fillet_2_edges, radius=FILLET_2_R)


solid = part.part
